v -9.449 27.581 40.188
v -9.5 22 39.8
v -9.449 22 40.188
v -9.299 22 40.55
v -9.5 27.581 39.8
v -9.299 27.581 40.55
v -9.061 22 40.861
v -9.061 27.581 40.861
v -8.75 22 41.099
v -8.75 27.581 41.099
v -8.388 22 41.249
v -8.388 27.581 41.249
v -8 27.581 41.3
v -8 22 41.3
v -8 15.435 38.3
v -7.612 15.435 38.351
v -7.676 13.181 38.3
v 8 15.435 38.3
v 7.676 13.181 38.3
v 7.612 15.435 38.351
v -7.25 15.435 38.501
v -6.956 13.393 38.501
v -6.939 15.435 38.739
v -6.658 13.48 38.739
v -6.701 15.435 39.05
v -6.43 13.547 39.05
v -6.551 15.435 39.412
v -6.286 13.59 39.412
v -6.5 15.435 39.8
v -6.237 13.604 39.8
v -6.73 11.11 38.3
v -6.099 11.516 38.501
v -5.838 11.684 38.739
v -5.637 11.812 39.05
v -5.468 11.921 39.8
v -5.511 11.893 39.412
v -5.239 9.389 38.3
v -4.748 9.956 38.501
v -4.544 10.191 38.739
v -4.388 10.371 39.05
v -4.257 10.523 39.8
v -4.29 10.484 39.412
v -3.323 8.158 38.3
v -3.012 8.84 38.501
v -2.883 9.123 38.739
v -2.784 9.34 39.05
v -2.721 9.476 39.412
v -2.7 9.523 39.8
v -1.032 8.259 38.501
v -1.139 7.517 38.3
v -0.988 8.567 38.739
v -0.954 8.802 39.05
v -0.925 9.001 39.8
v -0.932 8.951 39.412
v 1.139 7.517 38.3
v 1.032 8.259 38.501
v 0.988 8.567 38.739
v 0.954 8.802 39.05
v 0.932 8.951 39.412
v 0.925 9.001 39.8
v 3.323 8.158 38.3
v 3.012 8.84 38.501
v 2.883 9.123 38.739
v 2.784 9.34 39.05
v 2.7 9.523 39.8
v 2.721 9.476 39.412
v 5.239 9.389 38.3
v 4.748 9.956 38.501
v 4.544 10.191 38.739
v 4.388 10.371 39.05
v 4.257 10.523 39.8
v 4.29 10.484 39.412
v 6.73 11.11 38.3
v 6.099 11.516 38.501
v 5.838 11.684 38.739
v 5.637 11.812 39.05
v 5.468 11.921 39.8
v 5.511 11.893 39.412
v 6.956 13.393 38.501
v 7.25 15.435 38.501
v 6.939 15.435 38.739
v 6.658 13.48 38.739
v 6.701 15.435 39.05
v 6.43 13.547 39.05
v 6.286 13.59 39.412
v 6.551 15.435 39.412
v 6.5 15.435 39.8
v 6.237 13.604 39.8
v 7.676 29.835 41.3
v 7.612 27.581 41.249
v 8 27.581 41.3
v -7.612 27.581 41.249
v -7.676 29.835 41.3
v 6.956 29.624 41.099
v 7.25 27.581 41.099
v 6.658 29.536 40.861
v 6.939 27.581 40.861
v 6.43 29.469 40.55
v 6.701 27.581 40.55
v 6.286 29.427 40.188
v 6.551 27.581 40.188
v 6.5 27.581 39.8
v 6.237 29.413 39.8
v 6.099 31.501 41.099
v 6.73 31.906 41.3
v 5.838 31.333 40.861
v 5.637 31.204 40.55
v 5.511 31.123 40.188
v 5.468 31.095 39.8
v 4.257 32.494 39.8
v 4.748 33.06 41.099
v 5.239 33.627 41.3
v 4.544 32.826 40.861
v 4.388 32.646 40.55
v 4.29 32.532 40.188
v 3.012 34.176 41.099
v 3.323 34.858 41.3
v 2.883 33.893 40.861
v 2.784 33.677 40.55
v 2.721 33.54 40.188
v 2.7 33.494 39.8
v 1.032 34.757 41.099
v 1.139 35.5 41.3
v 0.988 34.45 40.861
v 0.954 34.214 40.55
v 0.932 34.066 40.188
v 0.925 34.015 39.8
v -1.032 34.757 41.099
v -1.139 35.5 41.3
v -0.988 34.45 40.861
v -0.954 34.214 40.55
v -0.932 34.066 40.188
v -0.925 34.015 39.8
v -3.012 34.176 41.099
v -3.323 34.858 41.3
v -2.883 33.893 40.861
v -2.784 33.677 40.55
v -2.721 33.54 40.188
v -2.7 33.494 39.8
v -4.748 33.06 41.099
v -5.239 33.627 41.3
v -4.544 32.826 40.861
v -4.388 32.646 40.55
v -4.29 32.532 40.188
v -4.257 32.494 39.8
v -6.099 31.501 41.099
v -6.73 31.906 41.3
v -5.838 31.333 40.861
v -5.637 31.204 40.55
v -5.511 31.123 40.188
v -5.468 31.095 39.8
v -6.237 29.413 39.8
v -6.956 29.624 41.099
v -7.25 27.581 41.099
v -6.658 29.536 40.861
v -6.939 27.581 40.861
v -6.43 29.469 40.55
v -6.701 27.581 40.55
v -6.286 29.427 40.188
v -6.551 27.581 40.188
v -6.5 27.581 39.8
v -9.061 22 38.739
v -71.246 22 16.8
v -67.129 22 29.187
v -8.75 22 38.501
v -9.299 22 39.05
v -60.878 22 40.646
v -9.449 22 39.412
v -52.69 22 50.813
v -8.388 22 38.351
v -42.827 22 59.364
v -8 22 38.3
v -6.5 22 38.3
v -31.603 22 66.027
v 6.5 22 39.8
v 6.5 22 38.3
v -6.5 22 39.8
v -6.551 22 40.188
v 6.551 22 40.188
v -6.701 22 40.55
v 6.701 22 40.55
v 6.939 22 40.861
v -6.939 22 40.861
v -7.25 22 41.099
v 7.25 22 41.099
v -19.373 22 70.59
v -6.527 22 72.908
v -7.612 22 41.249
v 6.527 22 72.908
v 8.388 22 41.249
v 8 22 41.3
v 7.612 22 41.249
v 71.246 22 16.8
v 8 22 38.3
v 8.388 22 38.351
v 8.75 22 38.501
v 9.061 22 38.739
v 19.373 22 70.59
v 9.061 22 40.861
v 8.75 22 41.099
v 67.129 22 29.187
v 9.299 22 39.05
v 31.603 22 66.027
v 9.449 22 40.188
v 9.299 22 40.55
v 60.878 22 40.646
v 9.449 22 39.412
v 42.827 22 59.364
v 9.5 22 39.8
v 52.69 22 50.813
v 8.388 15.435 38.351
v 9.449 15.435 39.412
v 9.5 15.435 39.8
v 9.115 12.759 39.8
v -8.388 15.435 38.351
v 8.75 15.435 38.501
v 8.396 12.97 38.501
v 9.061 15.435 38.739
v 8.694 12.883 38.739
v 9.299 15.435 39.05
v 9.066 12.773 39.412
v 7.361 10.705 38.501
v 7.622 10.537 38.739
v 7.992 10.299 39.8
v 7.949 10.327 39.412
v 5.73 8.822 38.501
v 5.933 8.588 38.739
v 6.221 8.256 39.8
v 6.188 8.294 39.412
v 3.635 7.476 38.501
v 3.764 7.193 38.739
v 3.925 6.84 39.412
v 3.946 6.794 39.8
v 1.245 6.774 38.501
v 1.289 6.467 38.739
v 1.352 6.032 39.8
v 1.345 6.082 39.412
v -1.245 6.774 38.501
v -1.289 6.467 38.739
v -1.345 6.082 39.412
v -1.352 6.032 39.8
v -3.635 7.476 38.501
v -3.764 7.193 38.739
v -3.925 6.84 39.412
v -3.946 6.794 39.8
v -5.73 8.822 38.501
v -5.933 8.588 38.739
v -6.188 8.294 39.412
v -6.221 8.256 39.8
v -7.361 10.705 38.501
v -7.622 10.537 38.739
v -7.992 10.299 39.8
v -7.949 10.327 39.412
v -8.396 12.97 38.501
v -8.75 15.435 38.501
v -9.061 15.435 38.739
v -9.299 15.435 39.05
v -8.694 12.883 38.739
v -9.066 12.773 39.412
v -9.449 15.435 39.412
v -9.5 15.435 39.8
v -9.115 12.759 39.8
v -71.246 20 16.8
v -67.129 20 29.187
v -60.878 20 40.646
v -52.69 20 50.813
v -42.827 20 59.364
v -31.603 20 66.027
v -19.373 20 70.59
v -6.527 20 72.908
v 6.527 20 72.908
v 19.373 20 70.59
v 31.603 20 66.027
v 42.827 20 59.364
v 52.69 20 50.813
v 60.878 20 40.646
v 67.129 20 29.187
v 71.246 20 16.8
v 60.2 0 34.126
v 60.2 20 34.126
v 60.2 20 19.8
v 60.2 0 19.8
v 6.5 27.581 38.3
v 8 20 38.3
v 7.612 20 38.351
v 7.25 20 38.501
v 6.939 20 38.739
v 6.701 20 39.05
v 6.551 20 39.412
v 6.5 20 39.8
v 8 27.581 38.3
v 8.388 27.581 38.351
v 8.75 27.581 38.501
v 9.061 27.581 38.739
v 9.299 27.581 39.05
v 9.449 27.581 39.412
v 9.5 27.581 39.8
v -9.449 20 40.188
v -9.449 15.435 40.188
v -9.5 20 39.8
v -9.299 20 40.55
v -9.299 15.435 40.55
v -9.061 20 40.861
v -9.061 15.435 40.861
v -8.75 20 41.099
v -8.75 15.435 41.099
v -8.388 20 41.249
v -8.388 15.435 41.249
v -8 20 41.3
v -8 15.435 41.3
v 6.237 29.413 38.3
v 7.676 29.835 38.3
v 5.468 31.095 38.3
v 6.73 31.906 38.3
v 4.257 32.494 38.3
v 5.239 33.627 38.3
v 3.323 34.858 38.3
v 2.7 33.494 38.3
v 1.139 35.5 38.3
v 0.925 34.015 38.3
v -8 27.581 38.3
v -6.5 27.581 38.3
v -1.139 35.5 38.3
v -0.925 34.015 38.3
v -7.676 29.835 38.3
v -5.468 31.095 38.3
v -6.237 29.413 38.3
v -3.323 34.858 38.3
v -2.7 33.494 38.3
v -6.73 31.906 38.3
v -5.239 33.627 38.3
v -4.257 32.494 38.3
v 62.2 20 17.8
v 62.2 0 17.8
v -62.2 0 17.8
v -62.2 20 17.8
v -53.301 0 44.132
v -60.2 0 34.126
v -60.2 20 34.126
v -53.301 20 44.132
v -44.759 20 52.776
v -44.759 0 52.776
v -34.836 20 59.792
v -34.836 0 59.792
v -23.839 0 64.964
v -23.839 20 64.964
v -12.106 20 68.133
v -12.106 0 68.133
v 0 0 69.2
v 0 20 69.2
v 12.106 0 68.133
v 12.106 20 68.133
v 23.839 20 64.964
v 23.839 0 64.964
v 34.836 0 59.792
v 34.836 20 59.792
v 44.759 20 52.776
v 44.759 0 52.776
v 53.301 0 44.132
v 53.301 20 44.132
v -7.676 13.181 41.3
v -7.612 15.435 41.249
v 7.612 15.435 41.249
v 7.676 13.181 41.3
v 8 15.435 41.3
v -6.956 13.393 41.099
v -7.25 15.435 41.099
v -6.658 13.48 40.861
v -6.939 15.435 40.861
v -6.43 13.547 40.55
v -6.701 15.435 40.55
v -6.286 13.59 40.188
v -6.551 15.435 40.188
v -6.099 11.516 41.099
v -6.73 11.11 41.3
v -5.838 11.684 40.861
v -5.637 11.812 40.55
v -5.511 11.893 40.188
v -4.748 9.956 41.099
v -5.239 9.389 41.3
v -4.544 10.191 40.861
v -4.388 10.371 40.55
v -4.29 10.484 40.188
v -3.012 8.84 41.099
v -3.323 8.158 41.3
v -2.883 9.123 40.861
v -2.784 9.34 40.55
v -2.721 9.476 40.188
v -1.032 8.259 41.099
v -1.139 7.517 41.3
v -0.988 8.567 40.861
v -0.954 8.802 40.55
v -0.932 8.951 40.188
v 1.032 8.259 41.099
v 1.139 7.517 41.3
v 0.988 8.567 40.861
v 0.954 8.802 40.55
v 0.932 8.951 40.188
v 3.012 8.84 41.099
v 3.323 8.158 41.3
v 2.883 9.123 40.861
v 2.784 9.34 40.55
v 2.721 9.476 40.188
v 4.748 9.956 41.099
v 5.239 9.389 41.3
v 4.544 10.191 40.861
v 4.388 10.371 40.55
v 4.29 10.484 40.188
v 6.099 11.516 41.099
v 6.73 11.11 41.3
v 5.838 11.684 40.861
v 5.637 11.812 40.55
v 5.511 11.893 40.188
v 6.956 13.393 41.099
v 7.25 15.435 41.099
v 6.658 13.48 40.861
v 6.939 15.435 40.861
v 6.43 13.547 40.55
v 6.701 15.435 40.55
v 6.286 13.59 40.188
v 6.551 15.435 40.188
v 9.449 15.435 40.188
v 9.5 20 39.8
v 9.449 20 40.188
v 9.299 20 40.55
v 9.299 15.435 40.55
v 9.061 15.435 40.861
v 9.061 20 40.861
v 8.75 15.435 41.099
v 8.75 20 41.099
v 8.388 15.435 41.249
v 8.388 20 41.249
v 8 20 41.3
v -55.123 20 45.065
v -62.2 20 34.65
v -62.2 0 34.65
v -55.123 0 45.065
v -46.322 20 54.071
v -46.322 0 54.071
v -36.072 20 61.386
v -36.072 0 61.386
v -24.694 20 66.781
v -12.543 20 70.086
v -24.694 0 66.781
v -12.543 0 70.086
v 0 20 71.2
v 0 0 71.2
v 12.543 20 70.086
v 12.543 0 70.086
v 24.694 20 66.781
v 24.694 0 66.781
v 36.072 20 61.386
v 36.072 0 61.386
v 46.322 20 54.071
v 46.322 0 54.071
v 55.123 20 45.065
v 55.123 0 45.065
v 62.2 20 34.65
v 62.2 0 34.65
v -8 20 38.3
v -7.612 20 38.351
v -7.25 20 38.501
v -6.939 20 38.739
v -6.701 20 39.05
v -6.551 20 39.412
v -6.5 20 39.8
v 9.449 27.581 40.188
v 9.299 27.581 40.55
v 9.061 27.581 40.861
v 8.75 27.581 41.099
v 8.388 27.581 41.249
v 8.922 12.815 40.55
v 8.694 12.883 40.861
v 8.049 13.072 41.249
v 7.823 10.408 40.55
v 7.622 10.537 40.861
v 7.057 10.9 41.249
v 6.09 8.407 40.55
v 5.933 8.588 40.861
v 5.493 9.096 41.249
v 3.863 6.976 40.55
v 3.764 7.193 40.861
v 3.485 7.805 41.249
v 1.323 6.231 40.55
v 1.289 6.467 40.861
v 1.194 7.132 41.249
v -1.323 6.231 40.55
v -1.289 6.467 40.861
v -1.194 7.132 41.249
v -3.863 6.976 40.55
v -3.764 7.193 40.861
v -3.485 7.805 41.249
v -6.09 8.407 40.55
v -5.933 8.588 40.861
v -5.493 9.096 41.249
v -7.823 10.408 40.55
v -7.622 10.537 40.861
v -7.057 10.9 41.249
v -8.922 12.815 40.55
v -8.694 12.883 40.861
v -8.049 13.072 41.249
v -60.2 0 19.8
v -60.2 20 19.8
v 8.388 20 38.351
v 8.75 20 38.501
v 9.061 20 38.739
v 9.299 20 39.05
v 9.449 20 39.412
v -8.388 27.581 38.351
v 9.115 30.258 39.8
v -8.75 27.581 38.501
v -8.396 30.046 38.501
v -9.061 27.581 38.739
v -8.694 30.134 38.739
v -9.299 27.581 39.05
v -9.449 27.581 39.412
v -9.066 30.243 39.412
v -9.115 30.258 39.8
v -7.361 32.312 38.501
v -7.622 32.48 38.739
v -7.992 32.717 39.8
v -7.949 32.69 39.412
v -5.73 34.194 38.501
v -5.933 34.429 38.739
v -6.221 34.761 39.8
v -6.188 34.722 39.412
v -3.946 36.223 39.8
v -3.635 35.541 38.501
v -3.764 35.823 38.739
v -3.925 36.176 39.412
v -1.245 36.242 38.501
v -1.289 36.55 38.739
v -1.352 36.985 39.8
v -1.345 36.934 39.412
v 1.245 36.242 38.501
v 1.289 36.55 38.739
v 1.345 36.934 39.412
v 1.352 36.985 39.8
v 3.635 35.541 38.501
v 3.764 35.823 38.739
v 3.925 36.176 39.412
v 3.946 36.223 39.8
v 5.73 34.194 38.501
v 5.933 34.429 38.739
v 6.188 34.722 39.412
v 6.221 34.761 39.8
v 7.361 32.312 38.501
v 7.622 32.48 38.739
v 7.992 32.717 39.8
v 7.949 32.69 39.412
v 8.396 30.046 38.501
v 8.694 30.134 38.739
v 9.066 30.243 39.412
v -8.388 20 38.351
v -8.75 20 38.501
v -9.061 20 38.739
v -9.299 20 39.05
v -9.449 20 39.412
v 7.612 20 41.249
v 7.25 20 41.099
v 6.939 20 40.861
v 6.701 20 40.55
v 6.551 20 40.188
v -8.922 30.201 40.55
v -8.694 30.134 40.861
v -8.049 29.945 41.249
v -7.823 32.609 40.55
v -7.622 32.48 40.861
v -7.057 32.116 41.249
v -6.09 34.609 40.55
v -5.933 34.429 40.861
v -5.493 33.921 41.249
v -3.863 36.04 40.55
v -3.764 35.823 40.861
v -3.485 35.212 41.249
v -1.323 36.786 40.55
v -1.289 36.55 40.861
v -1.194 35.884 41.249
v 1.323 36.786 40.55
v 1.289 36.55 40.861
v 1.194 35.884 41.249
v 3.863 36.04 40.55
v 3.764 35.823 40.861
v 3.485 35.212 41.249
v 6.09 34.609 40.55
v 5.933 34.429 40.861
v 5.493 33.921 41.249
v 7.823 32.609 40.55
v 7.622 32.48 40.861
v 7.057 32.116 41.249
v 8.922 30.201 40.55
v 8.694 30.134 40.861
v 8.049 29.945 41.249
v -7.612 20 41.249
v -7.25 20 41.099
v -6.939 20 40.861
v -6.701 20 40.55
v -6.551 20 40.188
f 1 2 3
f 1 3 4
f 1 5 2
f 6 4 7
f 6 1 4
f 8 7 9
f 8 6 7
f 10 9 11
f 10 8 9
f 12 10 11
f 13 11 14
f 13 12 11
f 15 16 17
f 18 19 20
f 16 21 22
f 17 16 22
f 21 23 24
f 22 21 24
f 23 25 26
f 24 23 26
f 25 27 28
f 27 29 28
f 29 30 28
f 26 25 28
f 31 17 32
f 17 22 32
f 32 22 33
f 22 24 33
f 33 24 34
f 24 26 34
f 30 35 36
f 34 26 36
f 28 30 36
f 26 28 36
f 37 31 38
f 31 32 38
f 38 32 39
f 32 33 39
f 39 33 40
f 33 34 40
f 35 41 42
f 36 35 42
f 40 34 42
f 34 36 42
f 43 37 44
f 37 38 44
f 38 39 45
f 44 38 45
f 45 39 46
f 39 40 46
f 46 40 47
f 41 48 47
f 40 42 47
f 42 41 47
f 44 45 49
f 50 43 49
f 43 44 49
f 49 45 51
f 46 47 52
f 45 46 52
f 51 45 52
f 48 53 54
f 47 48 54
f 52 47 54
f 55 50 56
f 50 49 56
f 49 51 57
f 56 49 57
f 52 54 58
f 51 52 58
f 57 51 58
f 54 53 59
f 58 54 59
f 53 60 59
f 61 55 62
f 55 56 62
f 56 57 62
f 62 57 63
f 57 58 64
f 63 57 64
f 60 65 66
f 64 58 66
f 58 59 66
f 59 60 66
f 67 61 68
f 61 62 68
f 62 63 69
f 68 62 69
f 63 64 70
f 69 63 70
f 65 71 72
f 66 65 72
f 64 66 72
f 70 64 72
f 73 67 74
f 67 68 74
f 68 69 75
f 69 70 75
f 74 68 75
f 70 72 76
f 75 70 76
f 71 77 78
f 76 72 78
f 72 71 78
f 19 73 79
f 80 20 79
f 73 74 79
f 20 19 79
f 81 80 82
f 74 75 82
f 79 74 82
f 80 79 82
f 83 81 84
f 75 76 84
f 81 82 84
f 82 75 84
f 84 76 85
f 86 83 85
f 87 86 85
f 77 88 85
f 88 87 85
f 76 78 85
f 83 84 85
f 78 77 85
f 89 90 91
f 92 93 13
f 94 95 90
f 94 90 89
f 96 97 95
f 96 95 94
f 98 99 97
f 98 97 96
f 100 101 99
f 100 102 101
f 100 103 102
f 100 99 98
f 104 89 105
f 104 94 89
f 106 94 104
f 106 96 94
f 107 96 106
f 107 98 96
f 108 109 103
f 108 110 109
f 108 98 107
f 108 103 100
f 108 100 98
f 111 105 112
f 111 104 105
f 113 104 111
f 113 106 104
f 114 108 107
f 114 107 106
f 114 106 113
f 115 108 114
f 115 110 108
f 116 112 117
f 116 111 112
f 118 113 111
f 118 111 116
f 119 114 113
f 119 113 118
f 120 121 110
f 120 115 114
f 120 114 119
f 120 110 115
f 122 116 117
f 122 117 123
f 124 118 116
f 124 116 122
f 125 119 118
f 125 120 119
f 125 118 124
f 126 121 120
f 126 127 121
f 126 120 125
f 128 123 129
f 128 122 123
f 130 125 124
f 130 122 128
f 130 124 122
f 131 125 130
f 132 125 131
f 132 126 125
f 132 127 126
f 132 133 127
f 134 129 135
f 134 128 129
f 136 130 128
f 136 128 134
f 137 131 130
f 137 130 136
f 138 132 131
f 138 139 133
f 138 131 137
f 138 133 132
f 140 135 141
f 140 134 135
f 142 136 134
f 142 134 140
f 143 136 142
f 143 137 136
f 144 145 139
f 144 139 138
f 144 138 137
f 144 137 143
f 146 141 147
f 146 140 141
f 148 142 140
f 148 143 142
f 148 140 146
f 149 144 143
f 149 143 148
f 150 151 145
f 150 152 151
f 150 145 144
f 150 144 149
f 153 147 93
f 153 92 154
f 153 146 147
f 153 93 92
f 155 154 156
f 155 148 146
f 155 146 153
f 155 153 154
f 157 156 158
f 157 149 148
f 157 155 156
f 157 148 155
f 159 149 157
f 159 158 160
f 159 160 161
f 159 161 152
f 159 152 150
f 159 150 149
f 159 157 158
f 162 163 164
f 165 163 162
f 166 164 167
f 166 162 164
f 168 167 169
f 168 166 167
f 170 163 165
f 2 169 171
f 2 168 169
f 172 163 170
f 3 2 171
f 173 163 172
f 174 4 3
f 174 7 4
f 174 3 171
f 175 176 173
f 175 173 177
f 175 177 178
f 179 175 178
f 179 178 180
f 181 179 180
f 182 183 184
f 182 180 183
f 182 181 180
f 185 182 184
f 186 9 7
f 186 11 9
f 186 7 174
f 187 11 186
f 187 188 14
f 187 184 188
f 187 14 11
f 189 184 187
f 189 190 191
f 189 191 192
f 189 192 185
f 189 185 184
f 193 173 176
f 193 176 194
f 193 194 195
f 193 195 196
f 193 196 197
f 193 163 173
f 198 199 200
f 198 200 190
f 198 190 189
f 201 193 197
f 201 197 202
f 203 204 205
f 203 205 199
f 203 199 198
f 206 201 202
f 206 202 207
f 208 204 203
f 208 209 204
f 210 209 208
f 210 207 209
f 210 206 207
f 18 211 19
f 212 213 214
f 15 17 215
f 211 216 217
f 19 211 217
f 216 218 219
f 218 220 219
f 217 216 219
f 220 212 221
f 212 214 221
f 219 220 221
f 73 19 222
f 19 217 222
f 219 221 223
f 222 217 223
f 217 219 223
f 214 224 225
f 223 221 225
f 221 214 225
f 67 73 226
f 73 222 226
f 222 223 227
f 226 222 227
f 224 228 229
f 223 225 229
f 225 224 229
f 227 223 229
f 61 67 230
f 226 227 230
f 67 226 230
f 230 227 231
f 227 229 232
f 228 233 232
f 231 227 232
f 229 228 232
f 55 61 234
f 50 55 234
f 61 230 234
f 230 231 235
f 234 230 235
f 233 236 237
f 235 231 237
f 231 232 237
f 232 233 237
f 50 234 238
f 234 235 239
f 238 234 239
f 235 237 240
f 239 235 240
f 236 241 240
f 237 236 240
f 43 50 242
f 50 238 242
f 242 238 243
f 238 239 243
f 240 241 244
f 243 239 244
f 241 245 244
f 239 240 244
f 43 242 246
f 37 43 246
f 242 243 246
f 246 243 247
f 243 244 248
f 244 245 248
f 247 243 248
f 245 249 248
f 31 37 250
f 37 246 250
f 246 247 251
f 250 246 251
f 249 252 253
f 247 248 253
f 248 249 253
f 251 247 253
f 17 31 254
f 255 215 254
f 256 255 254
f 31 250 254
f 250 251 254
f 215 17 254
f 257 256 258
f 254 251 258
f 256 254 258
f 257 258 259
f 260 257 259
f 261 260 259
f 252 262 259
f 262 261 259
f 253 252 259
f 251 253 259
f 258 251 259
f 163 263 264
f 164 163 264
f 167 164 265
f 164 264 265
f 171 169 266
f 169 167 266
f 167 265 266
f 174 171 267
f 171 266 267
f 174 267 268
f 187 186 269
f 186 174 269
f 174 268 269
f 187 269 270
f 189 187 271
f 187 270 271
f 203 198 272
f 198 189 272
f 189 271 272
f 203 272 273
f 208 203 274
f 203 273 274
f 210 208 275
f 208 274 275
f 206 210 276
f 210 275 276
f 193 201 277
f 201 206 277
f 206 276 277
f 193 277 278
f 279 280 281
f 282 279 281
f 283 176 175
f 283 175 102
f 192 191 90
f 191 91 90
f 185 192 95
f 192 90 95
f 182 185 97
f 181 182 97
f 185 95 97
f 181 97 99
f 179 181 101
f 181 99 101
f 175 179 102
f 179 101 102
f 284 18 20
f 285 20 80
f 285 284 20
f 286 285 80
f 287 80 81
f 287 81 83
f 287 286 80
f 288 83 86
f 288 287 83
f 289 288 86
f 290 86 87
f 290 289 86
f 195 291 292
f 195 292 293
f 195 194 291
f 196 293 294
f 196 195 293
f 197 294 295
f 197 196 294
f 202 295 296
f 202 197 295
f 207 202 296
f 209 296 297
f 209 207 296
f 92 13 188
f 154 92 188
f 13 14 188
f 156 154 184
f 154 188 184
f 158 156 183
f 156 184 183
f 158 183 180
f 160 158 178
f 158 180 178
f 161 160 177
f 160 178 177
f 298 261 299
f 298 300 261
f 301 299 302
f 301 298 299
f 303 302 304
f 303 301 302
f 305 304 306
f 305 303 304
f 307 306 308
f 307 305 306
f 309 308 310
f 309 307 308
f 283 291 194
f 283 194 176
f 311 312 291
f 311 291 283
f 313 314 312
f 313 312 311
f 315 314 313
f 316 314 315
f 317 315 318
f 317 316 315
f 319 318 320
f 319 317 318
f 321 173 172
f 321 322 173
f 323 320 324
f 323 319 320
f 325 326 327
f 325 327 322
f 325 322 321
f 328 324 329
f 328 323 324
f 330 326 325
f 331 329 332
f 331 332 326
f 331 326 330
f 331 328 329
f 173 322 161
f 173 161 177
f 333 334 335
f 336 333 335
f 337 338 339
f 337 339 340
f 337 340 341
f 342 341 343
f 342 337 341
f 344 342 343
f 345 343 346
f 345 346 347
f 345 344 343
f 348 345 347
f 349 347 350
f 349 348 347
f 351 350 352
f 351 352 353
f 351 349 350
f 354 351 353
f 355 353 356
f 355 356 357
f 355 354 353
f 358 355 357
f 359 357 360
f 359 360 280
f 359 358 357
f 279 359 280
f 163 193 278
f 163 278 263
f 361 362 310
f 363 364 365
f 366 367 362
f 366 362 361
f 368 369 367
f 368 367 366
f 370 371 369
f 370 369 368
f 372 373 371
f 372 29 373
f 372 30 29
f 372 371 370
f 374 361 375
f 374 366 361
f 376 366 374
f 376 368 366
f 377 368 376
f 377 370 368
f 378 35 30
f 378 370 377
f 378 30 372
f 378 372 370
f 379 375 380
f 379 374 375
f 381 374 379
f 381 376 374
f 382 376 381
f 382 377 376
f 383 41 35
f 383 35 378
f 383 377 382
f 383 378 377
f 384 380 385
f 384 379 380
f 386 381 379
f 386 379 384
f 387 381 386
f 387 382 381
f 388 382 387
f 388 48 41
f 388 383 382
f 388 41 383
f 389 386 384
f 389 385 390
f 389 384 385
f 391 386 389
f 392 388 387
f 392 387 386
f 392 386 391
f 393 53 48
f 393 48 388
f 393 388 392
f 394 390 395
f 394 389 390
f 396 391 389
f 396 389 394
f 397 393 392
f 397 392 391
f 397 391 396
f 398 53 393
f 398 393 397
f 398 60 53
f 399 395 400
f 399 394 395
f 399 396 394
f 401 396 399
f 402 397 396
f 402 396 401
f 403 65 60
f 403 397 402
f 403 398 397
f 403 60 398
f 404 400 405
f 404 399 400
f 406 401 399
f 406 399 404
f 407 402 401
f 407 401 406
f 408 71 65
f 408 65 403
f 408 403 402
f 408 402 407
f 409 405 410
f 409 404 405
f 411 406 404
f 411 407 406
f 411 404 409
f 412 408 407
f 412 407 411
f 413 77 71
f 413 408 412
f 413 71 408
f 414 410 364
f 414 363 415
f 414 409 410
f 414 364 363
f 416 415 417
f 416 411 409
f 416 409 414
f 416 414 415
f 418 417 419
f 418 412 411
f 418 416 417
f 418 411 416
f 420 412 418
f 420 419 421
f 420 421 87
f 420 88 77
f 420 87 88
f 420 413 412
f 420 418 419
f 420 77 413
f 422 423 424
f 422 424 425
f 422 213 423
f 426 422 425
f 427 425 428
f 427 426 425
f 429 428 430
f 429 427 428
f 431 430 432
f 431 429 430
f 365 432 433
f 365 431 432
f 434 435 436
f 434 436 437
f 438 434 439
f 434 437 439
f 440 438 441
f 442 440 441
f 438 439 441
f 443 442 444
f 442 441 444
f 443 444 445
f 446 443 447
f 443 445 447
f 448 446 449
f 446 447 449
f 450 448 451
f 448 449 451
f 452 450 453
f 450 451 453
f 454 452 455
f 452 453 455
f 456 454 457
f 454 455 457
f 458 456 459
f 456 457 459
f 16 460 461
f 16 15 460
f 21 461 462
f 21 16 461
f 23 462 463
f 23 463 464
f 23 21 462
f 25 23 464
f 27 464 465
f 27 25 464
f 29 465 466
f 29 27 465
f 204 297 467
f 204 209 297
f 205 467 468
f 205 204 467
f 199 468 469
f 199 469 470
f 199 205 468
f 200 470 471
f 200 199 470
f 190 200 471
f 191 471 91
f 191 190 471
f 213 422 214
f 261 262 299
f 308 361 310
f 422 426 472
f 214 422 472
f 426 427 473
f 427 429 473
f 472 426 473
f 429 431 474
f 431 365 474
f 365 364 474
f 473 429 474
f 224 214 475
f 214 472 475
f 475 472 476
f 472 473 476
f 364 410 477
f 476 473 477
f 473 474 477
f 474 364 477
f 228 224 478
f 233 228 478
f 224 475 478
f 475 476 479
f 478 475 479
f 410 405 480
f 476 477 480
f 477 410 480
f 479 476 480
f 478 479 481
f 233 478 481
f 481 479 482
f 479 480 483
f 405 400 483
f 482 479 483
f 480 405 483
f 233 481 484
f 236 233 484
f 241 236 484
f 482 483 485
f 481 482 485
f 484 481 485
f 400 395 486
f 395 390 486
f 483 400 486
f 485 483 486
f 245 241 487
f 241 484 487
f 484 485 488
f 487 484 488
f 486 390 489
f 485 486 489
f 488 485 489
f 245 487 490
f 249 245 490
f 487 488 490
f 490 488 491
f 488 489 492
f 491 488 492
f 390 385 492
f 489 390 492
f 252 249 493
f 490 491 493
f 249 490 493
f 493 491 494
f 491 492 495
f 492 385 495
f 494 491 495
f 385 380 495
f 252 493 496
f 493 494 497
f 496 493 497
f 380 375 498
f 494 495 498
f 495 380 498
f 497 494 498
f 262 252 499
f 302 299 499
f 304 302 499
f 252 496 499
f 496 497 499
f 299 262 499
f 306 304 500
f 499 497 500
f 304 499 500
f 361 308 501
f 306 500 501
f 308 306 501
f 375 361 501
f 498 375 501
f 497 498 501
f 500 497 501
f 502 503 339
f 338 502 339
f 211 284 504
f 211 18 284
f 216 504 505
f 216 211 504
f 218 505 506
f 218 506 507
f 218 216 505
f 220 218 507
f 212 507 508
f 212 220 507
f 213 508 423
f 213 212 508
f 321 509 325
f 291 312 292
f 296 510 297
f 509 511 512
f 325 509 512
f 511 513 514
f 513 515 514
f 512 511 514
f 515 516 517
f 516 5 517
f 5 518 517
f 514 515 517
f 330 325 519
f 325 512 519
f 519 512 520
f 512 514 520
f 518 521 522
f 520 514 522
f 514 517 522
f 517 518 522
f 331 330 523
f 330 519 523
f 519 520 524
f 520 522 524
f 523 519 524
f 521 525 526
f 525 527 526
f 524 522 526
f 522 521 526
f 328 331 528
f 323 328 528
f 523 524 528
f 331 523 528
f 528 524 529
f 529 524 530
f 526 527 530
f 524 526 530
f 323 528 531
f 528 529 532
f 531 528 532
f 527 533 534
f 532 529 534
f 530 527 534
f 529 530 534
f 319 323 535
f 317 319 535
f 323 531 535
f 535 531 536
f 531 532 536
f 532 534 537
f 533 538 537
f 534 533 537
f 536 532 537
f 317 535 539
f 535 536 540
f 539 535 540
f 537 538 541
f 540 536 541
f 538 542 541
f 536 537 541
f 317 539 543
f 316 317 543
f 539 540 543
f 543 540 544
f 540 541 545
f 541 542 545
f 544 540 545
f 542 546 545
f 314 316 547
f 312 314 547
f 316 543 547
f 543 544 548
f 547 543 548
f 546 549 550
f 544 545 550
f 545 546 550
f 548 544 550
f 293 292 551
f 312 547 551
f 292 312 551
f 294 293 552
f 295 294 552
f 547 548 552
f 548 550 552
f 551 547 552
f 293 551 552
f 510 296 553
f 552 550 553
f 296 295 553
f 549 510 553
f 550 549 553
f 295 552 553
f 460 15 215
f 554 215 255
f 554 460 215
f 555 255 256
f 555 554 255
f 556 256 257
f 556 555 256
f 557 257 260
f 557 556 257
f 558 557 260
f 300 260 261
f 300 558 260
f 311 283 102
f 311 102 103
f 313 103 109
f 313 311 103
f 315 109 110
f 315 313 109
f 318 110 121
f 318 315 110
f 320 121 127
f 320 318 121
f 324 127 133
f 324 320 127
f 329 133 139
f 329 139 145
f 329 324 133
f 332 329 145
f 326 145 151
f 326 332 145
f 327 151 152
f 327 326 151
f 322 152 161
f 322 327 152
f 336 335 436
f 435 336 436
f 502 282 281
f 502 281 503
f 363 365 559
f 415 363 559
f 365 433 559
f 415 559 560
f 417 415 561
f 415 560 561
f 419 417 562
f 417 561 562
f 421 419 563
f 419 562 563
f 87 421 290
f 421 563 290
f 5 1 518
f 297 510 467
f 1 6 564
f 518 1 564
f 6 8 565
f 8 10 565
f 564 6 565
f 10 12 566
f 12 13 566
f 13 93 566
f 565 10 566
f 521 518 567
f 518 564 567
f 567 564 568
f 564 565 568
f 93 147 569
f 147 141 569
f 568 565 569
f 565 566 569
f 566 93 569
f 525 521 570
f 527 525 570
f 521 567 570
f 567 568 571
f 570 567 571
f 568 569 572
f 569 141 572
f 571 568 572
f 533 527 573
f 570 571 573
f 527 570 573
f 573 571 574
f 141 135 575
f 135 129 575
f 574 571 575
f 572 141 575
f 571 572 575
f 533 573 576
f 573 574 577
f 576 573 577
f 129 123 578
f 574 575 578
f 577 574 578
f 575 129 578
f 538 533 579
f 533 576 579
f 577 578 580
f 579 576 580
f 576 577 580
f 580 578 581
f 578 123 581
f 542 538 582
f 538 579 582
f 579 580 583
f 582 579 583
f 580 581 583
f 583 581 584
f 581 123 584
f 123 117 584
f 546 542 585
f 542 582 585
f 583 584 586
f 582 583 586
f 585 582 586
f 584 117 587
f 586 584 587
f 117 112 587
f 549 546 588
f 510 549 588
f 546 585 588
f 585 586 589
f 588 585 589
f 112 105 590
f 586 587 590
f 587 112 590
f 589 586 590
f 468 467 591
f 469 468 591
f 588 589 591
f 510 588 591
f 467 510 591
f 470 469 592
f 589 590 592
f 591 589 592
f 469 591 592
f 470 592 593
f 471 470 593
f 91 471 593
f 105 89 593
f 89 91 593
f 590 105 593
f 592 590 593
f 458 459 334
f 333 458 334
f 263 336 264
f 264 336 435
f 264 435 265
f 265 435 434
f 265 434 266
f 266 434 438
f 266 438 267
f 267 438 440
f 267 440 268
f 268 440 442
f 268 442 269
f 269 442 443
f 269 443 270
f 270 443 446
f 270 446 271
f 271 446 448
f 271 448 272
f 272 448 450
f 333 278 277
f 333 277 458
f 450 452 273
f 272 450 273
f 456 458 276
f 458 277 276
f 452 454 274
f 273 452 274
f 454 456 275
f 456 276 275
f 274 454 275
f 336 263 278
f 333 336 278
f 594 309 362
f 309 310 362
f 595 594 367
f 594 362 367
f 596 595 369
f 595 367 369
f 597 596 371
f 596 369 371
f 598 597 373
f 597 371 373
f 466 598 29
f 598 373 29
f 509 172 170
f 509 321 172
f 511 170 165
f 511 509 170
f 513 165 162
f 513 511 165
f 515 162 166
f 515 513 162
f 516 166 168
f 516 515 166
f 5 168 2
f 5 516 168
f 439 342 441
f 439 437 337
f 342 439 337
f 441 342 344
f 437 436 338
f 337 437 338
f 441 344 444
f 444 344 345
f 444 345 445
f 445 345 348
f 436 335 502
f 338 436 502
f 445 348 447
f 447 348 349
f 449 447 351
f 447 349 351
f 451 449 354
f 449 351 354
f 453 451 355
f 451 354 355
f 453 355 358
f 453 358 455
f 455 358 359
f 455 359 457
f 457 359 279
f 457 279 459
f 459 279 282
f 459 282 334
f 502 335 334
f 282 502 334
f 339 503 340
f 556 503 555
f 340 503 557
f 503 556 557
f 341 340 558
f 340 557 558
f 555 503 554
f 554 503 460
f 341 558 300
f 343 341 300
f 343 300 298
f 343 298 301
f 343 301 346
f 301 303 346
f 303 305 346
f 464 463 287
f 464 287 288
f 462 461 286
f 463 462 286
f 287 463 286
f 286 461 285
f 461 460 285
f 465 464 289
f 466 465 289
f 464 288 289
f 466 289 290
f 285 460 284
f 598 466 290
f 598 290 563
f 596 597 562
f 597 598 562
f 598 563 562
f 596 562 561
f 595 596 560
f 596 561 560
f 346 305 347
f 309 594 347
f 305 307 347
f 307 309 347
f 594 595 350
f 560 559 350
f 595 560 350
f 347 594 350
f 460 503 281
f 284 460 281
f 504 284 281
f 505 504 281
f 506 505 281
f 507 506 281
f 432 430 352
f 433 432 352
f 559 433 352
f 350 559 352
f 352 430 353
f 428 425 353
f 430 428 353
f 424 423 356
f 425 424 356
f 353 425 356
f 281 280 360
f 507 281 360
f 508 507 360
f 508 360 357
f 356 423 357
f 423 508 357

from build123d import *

# Parameters (mm, degrees)
BOSS_EXTRUDE1_DEPTH      = 20
BOSS_EXTRUDE1_2_DEPTH    = 20
SKETCH2_R                = 73.2
BOSS_EXTRUDE2_DEPTH      = 2
BODY_DELETE_KEEP_1_DEPTH = 22
BOSS_EXTRUDE3_DEPTH      = 1.5
BOSS_EXTRUDE3_DEPTH_BACK = 1.5
FILLET2_R                = 1.5


# Read off the part's stored shape, not the designer's step: Body-Delete/Keep 1
with BuildPart() as part:
    # Sketch1 → Boss-Extrude1 (new body)
    with BuildSketch(Plane(origin=(0, 0, 0), x_dir=(1, 0, 0), z_dir=(0, 1, 0))):
        with BuildLine():
            Line((62.2, -17.8), (-62.2, -17.8))
            Line((-62.2, -17.8), (-62.2, -34.649675323))
            ThreePointArc((-62.2, -34.649675323), (0, -71.2), (62.2, -34.649675323))
            Line((62.2, -34.649675323), (62.2, -17.8))
        make_face()
        with BuildLine():
            Line((60.2, -34.126236241), (60.2, -19.8))
            Line((60.2, -19.8), (-60.2, -19.8))
            Line((-60.2, -19.8), (-60.2, -34.126236241))
            ThreePointArc((-60.2, -34.126236241), (0, -69.2), (60.2, -34.126236241))
        make_face(mode=Mode.SUBTRACT)
    extrude(amount=BOSS_EXTRUDE1_DEPTH)

    # Sketch2 → Boss-Extrude2 (add)
    with BuildSketch(Plane(origin=(0, 20, 0), x_dir=(1, 0, 0), z_dir=(0, 1, 0))):
        with Locations(Location((0, 0, 0), (0, 0, 270))):
            Circle(SKETCH2_R)
    extrude(amount=BOSS_EXTRUDE2_DEPTH)


with BuildPart() as body_2:
    # Sketch1 → Boss-Extrude1 2 (new body)
    with BuildSketch(Plane(origin=(0, 0, 0), x_dir=(1, 0, 0), z_dir=(0, 1, 0))):
        with BuildLine():
            Line((-62.2, -15.8), (62.2, -15.8))
            Line((62.2, -15.8), (62.2, 34.649675323))
            ThreePointArc((62.2, 34.649675323), (0, 71.2), (-62.2, 34.649675323))
            Line((-62.2, 34.649675323), (-62.2, -15.8))
        make_face()
        with BuildLine():
            Line((-60.2, 34.126236241), (-60.2, -13.8))
            Line((-60.2, -13.8), (60.2, -13.8))
            Line((60.2, -13.8), (60.2, 34.126236241))
            ThreePointArc((60.2, 34.126236241), (0, 69.2), (-60.2, 34.126236241))
        make_face(mode=Mode.SUBTRACT)
    extrude(amount=BOSS_EXTRUDE1_2_DEPTH)


with BuildPart() as body_3:
    # Split1: the piece on the far side of the plane
    add(part.part)
    split(bisect_by=Plane(origin=(0, 0, 16.8), x_dir=(-1, 0, 0), z_dir=(0, 0, -1)), keep=Keep.BOTTOM)

    # Sketch4 → Boss-Extrude3 (add, two sides: drawn at the far end of the back side and taken through both)
    with BuildSketch(Plane.XY.offset(39.8).offset(-BOSS_EXTRUDE3_DEPTH_BACK)):
        with BuildLine():
            Line((-9.5, 15.435211288), (-9.5, 27.581262171))
            ThreePointArc((-9.5, 27.581262171), (0, 37.081262171), (9.5, 27.581262171))
            Line((9.5, 27.581262171), (9.5, 15.435211288))
            ThreePointArc((9.5, 15.435211288), (0, 5.935211288), (-9.5, 15.435211288))
        make_face()
        with BuildLine():
            ThreePointArc((-6.5, 15.435211288), (0, 8.935211288), (6.5, 15.435211288))
            Line((6.5, 15.435211288), (6.5, 27.581262171))
            ThreePointArc((6.5, 27.581262171), (0, 34.081262171), (-6.5, 27.581262171))
            Line((-6.5, 27.581262171), (-6.5, 15.435211288))
        make_face(mode=Mode.SUBTRACT)
    extrude(amount=BOSS_EXTRUDE3_DEPTH + BOSS_EXTRUDE3_DEPTH_BACK)

    # Fillet2
    fillet2_edges = [body_3.edges().sort_by_distance(p)[0] for p in [
        (-9.5, 17.717605644, 41.3),
        (0, 5.935211288, 41.3),
        (9.5, 17.717605644, 41.3),
        (-6.5, 17.717605644, 41.3),
        (0, 8.935211288, 41.3),
        (6.5, 17.717605644, 41.3),
        (9.5, 17.717605644, 38.3),
        (6.5, 17.717605644, 38.3),
        (0, 8.935211288, 38.3),
        (-6.5, 17.717605644, 38.3),
        (0, 5.935211288, 38.3),
        (-9.5, 17.717605644, 38.3),
        (9.5, 24.790631086, 38.3),
        (0, 37.081262171, 38.3),
        (-9.5, 24.790631086, 38.3),
        (-9.5, 24.790631086, 41.3),
        (9.5, 24.790631086, 41.3),
        (6.5, 24.790631086, 41.3),
        (-6.5, 24.790631086, 41.3),
        (0, 34.081262171, 41.3),
        (0, 37.081262171, 41.3),
    ]]
    fillet(fillet2_edges, radius=FILLET2_R - 0.0001)  # a hair under: the kernel refuses the full size


with BuildPart() as part_1:
    add(part.part)

    # Split1
    split(bisect_by=Plane(origin=(0, 0, 16.8), x_dir=(-1, 0, 0), z_dir=(0, 0, -1)), keep=Keep.TOP)


with BuildPart() as body_delete_keep_1_tool:
    # Body-Delete/Keep 1 outline → Body-Delete/Keep 1 (new body)
    with BuildSketch(Plane(origin=(0, 0, 0), x_dir=(1, 0, 0), z_dir=(0, 1, 0))):
        with BuildLine():
            ThreePointArc((71.246052522, -16.8), (0, 73.2), (-71.246052522, -16.8))
            Line((-71.246052522, -16.8), (71.246052522, -16.8))
        make_face()
    extrude(amount=BODY_DELETE_KEEP_1_DEPTH)


with BuildPart() as part_2:
    add(part_1.part)

    # Body-Delete/Keep 1: cut by body_delete_keep_1_tool
    add(body_delete_keep_1_tool.part, mode=Mode.SUBTRACT)


with BuildPart() as body_2_1:
    add(body_2.part)

    # Body-Delete/Keep 1: cut by body_delete_keep_1_tool
    add(body_delete_keep_1_tool.part, mode=Mode.SUBTRACT)


solid = body_3.part
